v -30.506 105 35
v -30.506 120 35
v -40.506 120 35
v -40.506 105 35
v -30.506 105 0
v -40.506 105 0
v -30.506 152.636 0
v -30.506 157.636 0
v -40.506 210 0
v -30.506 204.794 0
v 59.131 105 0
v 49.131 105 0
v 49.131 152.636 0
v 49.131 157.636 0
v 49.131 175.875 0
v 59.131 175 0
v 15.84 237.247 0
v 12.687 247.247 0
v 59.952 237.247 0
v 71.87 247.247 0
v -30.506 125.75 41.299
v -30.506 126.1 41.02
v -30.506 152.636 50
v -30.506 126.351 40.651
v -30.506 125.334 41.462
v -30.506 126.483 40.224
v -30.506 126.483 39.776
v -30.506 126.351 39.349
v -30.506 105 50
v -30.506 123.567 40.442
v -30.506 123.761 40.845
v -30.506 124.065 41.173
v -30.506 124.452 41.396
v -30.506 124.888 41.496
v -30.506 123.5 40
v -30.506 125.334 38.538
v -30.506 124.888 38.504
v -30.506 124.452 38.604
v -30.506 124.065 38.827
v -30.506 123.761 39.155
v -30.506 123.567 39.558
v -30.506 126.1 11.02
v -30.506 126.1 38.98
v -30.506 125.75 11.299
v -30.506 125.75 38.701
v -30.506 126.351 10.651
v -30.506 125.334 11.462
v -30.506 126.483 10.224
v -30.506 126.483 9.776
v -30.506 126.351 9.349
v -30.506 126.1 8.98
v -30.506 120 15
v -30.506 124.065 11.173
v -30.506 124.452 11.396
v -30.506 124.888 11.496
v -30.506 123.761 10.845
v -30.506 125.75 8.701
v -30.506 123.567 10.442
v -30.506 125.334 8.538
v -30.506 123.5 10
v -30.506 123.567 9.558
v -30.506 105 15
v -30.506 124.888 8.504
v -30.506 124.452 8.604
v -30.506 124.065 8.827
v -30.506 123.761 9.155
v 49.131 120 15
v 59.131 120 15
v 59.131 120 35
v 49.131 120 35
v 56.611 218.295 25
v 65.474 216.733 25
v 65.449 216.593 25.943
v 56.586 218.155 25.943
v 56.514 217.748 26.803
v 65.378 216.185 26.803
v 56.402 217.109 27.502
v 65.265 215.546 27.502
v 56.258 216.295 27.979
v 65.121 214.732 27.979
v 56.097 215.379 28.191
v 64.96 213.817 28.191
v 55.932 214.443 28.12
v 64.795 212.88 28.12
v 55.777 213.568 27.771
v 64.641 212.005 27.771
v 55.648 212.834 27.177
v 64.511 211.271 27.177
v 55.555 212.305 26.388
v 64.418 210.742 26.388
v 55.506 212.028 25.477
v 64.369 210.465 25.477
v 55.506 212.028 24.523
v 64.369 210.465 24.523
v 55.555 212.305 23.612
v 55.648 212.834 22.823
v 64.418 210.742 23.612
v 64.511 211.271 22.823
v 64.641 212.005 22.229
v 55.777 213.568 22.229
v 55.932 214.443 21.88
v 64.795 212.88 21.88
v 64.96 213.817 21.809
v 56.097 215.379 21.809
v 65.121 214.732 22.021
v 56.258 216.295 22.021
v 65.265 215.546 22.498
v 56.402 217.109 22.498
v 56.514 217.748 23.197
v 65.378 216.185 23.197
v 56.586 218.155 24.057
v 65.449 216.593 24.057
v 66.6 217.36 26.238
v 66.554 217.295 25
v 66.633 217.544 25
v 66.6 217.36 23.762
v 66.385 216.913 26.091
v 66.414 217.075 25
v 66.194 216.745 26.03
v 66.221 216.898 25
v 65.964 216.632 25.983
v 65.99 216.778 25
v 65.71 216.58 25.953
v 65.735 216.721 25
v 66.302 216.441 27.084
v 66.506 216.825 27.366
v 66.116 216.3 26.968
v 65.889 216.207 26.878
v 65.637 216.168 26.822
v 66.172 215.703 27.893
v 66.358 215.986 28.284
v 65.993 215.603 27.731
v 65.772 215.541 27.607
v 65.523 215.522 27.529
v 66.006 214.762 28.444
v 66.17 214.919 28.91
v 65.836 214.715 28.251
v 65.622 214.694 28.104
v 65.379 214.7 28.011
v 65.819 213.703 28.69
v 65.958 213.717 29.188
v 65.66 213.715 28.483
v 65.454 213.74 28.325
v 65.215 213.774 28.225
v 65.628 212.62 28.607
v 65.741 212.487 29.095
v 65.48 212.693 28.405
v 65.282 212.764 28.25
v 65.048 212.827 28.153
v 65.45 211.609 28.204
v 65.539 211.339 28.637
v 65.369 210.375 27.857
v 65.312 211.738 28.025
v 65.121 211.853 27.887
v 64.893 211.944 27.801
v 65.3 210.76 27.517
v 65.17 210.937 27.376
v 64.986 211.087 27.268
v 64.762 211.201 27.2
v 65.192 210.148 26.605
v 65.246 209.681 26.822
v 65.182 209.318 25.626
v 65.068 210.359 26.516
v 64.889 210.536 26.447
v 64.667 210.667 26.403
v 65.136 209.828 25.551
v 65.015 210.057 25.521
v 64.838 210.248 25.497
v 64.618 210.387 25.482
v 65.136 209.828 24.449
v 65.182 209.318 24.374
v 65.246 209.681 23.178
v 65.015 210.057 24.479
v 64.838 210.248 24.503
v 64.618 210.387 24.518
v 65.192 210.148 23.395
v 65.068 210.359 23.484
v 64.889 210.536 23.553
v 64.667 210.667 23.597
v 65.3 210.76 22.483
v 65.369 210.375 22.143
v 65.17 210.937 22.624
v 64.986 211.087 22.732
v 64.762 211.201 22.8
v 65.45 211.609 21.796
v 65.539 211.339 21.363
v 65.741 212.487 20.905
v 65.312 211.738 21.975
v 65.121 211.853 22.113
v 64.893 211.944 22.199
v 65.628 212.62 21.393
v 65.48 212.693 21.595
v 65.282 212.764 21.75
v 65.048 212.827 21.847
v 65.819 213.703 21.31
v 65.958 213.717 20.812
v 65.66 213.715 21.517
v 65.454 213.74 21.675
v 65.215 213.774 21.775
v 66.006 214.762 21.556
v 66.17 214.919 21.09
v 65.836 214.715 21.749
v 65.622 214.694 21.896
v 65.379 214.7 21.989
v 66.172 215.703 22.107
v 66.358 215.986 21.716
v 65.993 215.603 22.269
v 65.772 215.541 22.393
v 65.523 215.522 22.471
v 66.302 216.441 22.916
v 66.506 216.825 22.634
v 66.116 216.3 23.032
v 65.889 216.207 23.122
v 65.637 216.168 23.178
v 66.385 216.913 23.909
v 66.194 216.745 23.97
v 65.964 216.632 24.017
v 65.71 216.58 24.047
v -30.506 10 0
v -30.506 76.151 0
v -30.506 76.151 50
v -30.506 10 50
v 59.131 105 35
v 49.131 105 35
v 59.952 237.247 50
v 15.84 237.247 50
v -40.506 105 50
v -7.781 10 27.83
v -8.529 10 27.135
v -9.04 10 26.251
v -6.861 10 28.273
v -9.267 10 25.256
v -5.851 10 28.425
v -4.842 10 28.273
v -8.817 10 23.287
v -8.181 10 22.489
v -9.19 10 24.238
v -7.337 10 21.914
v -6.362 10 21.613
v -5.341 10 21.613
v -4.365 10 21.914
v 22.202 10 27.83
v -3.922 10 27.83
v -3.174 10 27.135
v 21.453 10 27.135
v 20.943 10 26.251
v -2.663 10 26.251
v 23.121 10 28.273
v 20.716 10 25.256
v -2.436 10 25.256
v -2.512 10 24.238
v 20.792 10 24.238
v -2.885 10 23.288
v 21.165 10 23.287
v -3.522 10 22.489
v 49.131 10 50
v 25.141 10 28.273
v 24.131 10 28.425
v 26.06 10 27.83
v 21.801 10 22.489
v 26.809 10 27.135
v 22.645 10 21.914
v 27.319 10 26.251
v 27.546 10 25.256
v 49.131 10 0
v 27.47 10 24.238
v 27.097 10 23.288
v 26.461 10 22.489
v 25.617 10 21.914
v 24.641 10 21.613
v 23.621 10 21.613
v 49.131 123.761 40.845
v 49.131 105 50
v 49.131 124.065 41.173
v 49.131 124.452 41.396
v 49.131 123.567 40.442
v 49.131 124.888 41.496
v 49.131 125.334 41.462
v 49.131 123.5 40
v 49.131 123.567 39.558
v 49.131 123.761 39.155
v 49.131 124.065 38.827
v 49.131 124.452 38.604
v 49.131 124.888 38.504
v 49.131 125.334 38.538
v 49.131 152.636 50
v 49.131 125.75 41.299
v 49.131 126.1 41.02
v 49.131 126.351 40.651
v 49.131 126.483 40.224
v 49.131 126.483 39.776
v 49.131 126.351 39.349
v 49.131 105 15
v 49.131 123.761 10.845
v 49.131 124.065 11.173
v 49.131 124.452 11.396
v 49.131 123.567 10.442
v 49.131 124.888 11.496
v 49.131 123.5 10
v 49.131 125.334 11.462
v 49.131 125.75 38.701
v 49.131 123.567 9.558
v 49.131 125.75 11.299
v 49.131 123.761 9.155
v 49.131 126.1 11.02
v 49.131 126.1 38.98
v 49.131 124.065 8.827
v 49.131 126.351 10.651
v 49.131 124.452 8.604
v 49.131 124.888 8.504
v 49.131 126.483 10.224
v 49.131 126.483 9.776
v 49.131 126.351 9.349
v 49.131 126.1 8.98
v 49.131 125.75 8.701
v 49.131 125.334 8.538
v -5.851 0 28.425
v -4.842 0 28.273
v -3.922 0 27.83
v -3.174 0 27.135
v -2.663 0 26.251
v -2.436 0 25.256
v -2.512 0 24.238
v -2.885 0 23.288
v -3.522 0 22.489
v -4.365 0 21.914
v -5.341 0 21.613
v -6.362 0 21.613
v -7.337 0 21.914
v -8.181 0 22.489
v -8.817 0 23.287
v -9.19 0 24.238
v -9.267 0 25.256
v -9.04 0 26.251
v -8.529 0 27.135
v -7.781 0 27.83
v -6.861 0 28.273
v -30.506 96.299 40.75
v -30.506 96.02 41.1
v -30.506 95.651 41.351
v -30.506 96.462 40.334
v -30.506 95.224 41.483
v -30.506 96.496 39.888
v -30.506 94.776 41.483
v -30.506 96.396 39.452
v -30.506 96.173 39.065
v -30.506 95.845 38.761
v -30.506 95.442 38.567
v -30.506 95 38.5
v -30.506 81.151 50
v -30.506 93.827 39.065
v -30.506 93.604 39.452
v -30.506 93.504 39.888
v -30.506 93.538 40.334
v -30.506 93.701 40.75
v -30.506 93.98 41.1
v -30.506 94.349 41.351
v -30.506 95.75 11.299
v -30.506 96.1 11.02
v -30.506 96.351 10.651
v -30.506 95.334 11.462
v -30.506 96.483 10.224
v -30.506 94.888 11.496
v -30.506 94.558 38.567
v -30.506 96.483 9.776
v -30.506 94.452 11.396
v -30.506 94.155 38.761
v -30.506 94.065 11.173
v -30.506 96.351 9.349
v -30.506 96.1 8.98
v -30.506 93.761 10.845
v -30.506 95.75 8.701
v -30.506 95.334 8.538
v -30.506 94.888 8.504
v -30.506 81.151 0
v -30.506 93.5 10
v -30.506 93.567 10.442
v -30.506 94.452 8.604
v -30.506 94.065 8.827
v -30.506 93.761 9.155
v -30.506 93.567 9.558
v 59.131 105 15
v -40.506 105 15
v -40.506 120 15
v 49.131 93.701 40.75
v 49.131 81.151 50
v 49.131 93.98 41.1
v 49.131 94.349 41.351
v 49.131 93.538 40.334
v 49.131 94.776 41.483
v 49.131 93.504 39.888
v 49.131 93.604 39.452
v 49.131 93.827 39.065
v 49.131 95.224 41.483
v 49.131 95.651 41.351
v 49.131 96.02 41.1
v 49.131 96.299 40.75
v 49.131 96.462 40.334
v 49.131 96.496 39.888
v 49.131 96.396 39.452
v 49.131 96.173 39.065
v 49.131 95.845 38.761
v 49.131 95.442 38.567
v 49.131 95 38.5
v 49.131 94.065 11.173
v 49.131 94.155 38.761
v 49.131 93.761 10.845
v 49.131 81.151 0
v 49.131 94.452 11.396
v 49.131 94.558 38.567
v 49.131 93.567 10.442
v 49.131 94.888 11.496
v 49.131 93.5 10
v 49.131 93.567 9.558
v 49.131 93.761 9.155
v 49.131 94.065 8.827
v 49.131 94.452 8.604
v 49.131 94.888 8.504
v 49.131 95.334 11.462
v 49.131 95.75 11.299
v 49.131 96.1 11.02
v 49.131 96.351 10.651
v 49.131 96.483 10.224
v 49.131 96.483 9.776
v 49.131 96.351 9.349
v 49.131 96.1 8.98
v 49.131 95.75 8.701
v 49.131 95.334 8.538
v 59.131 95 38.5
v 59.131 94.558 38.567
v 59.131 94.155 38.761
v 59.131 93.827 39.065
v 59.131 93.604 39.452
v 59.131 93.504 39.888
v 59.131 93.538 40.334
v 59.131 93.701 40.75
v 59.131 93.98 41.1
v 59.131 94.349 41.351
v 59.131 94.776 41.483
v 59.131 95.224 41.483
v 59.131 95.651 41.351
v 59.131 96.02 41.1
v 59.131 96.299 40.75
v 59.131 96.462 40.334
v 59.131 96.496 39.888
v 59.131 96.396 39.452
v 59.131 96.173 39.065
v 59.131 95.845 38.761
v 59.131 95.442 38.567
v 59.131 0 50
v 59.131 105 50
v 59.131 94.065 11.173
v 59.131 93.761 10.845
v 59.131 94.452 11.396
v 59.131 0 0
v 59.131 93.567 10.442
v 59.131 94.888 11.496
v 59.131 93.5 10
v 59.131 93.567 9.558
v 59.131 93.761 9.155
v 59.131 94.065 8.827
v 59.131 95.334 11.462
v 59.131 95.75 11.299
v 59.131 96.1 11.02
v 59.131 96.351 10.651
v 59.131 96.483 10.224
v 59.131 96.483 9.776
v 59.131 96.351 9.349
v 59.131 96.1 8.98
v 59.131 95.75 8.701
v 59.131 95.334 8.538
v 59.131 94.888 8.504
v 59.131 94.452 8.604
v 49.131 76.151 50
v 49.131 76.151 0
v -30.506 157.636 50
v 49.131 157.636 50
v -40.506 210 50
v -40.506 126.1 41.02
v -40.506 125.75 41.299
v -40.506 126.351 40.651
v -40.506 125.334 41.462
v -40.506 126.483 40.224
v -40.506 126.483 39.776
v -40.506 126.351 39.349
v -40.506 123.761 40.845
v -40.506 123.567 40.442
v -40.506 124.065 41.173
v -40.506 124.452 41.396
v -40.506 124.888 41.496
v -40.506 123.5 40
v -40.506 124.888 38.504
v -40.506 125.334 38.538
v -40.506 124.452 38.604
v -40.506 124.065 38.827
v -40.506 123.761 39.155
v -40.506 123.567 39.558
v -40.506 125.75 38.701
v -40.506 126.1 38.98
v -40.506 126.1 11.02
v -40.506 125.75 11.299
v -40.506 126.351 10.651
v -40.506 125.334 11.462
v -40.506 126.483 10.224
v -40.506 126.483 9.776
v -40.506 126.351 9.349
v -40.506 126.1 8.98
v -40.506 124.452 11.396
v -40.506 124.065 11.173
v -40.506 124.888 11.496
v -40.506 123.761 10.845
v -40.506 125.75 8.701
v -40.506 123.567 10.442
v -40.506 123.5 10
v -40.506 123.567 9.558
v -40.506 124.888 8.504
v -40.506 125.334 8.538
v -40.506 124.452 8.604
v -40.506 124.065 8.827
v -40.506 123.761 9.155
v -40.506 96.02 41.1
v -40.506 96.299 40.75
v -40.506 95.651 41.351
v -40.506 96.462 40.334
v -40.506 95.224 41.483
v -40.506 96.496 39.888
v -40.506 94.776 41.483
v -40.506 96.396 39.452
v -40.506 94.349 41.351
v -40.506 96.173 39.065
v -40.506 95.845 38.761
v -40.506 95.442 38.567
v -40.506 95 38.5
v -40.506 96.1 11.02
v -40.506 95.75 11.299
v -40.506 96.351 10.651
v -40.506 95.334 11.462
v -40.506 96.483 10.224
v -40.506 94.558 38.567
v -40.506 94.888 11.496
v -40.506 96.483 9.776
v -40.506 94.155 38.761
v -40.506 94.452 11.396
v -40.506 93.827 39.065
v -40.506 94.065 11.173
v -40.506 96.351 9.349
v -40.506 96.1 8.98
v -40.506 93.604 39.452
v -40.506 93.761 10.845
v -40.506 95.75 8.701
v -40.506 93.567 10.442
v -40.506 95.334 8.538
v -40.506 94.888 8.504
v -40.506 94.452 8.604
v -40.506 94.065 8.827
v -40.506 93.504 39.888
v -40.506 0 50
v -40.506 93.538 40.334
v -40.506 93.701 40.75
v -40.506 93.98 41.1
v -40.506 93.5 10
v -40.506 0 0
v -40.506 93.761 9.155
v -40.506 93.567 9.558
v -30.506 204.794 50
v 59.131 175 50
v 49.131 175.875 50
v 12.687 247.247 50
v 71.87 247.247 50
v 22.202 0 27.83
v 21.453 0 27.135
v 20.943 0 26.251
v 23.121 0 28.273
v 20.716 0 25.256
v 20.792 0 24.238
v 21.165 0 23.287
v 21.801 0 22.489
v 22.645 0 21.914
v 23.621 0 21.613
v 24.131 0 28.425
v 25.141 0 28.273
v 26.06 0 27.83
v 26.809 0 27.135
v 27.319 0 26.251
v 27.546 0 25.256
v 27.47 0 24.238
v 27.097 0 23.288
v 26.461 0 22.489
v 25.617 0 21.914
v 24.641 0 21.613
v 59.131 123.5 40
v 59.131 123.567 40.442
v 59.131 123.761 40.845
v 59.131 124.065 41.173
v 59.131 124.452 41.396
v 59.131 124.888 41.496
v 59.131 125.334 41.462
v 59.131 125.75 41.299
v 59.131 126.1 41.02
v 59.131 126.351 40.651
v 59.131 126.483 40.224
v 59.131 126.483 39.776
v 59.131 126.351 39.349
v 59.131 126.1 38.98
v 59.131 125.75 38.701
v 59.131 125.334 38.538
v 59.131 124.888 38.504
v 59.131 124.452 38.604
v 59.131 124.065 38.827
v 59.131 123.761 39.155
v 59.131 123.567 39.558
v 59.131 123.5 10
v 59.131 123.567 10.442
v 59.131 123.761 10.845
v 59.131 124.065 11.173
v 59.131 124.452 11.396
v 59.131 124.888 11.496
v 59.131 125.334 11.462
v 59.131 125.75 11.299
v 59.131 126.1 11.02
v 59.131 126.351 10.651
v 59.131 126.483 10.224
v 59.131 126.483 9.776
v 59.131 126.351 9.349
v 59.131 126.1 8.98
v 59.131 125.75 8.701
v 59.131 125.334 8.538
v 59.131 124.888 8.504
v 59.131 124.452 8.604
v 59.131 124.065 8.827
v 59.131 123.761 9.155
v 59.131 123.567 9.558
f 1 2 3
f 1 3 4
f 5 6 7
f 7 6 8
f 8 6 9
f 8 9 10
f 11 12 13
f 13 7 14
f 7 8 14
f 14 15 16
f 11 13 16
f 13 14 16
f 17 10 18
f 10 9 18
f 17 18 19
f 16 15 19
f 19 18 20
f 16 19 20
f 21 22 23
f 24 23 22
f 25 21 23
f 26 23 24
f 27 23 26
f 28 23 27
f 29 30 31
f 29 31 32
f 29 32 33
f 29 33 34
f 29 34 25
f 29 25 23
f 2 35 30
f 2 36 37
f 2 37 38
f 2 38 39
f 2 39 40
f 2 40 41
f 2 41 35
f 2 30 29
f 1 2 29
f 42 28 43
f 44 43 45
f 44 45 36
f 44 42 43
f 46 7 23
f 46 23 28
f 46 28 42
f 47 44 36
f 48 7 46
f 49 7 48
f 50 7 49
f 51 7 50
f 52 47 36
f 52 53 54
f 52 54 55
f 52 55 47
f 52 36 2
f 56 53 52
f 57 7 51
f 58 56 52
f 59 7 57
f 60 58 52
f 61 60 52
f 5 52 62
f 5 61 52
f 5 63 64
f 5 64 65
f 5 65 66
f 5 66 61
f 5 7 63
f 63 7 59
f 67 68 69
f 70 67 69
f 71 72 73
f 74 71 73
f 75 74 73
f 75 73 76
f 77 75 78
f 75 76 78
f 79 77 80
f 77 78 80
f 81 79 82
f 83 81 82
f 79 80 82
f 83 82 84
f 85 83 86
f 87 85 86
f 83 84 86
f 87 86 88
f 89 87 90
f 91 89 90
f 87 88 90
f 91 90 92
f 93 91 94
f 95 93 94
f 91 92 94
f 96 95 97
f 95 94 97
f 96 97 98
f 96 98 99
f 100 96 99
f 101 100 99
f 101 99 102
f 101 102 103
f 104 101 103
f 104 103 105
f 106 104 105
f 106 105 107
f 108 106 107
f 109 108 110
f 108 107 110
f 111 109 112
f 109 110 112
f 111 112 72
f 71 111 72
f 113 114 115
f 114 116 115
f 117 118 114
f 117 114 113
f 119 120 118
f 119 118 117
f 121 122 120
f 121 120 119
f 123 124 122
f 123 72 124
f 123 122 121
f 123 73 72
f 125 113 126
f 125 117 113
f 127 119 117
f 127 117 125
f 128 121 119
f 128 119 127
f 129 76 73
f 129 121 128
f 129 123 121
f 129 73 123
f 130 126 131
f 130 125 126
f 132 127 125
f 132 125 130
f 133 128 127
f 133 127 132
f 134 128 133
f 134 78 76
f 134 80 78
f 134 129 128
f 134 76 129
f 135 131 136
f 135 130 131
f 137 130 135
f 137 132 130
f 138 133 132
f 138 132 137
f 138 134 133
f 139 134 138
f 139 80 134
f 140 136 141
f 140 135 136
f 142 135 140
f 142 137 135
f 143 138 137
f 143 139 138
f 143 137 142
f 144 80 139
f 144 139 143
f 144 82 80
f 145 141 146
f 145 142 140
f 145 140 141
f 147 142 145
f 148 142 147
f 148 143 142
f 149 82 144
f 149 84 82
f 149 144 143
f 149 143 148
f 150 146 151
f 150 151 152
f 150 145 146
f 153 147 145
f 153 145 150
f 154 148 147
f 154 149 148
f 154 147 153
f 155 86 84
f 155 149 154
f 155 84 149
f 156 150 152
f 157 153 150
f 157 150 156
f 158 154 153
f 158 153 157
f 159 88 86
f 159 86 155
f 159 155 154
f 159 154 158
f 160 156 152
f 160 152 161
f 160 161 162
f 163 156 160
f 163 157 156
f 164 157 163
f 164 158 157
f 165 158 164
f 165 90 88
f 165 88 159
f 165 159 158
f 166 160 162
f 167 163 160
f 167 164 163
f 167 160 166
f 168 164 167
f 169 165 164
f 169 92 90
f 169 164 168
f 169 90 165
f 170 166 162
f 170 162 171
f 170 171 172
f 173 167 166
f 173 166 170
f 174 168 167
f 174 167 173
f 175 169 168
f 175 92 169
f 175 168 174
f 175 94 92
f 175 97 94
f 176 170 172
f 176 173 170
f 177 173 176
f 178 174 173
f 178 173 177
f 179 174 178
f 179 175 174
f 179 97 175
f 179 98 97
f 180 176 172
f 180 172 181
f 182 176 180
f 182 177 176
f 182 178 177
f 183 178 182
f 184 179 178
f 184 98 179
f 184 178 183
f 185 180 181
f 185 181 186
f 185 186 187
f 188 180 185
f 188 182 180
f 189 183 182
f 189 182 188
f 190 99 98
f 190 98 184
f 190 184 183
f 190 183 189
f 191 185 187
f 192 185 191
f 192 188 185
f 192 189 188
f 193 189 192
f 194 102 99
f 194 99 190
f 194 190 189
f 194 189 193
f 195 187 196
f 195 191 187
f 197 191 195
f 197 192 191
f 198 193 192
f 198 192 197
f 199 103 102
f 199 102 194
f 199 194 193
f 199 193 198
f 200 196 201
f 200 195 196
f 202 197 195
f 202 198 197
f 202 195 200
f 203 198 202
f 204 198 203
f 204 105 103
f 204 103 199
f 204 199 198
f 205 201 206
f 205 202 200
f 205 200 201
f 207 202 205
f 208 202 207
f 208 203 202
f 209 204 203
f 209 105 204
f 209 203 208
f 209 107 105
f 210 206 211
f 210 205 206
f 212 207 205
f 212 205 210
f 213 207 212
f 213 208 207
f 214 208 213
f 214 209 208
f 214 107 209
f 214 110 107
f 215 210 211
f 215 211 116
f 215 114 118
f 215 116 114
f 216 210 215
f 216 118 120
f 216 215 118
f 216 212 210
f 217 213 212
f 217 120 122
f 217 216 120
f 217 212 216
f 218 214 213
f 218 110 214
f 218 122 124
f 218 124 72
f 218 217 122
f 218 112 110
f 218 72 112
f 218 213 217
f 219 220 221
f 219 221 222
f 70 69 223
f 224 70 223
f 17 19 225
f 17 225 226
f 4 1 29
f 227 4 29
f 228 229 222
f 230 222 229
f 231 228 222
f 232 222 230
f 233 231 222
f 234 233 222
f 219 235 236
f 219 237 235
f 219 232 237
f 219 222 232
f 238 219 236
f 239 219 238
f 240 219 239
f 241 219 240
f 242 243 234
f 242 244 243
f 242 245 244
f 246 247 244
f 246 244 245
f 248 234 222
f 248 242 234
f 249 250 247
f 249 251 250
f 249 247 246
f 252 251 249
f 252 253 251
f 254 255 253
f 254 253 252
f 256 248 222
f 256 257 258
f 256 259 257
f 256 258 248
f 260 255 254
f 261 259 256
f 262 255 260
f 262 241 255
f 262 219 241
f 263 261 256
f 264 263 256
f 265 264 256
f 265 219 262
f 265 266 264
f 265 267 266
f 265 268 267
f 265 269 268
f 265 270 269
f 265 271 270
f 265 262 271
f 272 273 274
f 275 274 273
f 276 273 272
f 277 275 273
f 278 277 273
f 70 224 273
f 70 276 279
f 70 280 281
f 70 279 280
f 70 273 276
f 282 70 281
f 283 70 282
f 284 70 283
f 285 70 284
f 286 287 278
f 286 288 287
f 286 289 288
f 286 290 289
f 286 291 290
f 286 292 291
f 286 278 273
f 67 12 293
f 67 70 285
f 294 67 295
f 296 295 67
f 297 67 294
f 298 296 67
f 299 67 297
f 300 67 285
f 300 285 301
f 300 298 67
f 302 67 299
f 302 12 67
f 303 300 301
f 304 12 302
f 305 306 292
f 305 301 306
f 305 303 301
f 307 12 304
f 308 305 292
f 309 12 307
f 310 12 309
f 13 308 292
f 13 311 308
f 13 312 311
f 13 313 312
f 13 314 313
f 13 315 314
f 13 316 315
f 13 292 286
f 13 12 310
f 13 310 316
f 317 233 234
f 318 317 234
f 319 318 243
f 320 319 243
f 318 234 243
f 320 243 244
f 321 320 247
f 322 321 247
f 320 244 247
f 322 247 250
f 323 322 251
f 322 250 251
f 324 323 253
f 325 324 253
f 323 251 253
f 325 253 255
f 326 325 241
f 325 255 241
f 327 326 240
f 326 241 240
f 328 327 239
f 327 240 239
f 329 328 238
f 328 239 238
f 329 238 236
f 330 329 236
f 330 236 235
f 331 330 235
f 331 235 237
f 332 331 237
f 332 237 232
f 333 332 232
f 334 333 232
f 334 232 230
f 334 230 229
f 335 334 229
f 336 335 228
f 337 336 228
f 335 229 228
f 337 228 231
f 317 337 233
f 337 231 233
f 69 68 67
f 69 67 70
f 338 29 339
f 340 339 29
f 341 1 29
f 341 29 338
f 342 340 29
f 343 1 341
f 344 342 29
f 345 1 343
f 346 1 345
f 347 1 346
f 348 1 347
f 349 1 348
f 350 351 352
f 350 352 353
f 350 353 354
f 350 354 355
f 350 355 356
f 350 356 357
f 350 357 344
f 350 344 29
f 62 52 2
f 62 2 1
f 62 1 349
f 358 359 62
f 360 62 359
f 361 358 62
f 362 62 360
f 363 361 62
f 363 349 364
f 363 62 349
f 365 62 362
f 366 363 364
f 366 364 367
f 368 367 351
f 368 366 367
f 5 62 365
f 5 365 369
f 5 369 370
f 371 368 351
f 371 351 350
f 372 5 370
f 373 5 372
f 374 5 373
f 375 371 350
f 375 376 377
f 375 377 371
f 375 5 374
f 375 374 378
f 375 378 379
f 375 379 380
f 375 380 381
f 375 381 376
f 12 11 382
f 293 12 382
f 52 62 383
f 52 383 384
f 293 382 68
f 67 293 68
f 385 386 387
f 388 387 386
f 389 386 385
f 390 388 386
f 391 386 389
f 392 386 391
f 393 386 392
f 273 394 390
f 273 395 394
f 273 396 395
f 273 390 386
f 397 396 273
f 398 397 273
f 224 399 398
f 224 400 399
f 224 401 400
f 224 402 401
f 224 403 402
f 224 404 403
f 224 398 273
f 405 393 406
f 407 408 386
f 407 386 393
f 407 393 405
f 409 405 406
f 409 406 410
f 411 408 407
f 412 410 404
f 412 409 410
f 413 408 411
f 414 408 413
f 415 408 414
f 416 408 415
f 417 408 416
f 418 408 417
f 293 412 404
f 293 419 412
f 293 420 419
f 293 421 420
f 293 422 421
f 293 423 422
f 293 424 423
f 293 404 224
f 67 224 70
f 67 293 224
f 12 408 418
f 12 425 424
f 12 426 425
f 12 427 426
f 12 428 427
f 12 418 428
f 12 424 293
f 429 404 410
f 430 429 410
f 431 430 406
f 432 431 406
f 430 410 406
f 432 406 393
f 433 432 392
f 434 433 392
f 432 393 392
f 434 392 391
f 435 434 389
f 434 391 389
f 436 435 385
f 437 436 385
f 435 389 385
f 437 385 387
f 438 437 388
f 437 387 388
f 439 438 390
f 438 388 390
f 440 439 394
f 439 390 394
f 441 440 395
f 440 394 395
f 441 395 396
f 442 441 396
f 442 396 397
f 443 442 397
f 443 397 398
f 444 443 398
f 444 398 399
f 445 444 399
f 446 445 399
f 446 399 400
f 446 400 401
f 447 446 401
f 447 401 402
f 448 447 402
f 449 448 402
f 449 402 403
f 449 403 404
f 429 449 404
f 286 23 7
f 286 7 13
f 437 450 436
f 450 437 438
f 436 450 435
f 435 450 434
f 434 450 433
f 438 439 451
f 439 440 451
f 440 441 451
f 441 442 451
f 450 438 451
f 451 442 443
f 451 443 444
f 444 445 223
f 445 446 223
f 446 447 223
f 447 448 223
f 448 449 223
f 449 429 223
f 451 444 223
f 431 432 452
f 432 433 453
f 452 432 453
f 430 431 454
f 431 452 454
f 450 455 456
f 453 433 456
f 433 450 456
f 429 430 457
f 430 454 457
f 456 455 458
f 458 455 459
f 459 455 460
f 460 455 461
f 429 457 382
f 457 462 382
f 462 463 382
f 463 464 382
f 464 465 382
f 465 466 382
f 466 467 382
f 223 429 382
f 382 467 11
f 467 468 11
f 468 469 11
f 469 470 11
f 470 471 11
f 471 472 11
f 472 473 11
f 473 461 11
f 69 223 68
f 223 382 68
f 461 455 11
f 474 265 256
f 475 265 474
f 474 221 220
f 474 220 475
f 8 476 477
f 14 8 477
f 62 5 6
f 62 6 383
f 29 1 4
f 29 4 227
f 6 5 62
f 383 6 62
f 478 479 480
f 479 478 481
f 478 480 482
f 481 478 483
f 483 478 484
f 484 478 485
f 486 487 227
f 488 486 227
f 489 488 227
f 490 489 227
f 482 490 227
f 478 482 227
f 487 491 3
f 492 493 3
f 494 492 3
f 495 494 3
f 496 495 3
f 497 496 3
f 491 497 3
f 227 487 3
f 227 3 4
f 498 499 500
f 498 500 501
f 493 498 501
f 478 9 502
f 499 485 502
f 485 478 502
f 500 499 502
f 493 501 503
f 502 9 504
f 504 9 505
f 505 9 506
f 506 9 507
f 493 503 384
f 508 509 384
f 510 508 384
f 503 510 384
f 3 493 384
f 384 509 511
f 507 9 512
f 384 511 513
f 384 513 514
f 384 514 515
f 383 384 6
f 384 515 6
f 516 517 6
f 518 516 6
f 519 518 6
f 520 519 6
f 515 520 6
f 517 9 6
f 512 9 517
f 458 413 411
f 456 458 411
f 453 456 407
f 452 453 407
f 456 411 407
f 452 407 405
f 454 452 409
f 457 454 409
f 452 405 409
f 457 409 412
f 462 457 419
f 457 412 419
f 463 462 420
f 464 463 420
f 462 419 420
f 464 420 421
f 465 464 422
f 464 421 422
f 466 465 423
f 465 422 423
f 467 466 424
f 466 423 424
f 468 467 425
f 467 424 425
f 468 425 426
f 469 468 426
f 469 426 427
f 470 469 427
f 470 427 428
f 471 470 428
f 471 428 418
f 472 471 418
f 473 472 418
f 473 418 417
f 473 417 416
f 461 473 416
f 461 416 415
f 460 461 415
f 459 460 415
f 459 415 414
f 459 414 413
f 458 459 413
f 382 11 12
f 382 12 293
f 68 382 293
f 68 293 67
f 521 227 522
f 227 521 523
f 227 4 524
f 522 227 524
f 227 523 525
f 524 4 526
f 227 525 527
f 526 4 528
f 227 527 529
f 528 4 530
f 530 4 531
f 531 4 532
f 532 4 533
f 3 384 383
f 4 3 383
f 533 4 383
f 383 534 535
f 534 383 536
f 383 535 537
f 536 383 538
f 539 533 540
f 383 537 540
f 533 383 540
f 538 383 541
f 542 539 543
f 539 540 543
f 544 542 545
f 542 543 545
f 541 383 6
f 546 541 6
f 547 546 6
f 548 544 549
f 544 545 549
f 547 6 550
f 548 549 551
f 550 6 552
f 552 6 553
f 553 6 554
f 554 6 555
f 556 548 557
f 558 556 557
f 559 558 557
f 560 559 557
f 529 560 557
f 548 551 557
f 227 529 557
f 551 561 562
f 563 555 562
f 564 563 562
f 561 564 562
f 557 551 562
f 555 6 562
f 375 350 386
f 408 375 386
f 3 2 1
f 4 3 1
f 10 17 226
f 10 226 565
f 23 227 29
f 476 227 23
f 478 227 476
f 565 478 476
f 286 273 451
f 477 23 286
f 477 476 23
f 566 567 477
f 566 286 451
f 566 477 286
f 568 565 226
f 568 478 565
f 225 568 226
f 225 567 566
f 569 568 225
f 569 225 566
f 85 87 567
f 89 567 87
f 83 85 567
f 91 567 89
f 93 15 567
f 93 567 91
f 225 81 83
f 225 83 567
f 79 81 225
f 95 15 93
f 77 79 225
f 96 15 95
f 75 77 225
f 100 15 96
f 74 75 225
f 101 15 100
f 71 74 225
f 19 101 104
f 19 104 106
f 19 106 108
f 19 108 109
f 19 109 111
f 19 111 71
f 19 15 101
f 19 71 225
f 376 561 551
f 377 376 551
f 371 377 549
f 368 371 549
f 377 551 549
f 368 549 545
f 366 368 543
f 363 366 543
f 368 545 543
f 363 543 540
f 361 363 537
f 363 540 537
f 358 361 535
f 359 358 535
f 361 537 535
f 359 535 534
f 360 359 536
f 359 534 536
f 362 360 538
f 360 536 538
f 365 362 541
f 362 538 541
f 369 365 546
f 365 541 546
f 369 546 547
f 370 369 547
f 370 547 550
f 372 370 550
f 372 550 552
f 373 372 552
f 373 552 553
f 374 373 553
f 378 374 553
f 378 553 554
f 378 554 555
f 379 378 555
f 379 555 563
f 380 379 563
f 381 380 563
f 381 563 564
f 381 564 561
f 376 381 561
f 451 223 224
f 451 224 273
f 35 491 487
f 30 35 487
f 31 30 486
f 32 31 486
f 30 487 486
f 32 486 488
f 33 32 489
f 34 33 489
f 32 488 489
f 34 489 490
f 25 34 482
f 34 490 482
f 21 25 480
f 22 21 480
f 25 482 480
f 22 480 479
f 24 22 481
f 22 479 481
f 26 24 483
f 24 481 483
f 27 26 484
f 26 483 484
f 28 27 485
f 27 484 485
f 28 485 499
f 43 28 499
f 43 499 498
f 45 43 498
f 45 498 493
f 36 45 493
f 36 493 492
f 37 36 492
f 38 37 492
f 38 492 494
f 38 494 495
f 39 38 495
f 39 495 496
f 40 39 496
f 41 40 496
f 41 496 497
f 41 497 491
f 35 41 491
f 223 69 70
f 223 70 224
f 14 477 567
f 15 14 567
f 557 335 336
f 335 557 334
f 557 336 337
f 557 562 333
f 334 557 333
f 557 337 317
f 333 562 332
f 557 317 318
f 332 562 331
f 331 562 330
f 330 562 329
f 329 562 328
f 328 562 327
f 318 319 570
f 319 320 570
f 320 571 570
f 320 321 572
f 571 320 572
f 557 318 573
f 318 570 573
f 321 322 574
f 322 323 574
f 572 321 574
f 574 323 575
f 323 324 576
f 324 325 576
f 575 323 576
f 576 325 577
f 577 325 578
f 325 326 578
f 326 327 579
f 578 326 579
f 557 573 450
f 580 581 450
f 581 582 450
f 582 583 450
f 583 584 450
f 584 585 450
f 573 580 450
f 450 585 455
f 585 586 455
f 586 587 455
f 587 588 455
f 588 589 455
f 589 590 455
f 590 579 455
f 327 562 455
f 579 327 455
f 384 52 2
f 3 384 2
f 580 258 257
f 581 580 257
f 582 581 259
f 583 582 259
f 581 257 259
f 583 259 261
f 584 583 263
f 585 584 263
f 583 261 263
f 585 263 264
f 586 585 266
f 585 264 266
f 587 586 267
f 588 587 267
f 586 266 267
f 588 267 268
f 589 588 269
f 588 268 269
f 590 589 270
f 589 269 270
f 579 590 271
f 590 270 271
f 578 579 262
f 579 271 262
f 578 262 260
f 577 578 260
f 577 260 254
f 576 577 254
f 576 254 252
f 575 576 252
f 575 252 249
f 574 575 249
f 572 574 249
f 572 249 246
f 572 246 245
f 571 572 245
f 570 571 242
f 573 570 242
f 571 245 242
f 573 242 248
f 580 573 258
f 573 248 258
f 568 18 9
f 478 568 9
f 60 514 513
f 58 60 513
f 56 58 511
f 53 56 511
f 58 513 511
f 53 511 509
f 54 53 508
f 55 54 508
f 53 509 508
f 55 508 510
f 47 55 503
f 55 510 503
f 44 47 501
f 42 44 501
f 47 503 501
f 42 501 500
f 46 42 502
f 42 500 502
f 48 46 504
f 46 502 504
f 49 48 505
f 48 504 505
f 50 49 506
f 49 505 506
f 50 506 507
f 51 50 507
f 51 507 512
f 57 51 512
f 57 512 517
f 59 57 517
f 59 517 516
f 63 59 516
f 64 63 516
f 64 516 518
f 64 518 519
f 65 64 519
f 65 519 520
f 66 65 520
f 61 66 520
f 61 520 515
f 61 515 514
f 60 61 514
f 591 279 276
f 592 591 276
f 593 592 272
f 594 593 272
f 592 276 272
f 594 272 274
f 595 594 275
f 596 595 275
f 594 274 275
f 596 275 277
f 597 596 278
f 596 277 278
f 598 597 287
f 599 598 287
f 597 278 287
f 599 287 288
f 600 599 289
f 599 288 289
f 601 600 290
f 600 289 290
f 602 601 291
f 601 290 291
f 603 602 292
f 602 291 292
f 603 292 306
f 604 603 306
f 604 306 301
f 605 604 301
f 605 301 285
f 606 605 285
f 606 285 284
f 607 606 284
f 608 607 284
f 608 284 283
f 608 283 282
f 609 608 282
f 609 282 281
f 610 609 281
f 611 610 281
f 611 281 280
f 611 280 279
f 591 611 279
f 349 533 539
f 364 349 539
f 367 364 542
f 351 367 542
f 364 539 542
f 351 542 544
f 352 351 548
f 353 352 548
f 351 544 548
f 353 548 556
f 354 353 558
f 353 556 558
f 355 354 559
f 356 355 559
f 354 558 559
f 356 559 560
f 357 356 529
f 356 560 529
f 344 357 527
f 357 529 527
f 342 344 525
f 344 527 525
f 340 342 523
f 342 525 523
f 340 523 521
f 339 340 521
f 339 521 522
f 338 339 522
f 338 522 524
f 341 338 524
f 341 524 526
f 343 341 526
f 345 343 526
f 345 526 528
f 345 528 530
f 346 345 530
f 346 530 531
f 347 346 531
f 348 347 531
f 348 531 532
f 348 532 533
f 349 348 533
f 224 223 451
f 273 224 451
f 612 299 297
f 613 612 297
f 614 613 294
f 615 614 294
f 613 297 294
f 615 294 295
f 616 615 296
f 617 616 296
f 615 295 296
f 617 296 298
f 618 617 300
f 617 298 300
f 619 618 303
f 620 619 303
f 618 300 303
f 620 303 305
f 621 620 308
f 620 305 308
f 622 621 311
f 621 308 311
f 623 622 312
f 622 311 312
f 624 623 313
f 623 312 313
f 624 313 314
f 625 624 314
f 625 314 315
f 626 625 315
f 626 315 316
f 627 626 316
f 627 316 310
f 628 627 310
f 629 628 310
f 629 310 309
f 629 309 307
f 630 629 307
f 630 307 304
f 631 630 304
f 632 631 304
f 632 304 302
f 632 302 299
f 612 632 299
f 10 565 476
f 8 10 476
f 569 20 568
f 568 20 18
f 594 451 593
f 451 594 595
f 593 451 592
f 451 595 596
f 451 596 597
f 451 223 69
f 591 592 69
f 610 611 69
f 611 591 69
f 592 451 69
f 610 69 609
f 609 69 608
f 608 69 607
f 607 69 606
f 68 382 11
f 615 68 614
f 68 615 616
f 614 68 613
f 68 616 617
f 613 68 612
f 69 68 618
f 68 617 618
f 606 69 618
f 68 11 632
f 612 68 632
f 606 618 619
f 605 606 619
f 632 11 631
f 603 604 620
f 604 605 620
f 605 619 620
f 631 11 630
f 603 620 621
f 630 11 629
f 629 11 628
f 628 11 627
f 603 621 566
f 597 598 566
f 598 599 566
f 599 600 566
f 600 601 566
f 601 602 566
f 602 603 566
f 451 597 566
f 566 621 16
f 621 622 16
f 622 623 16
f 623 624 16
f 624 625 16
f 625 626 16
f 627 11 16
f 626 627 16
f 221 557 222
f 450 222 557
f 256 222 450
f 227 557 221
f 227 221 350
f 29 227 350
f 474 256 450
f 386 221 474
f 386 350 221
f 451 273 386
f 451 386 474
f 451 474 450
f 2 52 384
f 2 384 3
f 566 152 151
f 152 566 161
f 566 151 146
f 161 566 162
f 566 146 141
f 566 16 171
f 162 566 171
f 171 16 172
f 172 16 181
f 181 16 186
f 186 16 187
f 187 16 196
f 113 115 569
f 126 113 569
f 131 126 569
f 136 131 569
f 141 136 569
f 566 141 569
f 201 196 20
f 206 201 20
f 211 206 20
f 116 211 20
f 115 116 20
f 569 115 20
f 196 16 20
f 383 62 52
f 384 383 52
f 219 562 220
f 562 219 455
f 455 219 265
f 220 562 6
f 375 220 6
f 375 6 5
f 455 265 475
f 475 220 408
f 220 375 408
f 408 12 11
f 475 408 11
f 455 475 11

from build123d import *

# Parameters (mm, degrees)
BOSS_EXTRUDE1_DEPTH    = 50
SKETCH10_R             = 3.425
CUT_EXTRUDE5_DEPTH     = 10
SKETCH11_W             = 79.637459777
SKETCH11_H             = 5
BOSS_EXTRUDE3_DEPTH    = 50
SKETCH14_R             = 3.2
CUT_EXTRUDE6_DEPTH     = 10
FILLET1_R              = 1
SPLIT1_SURFACE_1_BACK  = 277.151
SPLIT1_SURFACE_1_DEPTH = 554.302
SPLIT1_SURFACE_2_BACK  = 277.151
SPLIT1_SURFACE_2_DEPTH = 554.302
SKETCH16_R             = 1.5
CUT_EXTRUDE7_DEPTH     = 99.637459777
CUT_EXTRUDE8_REACH     = 278.151
SKETCH17_R             = 1.5


with BuildPart() as part:
    # Sketch2 → Boss-Extrude1 (new body)
    with BuildSketch(Plane.XY):
        Polygon((-40.506485759, 0), (59.130974018, 0), (59.130974018, 175), (71.870010435, 247.246665631), (12.687265519, 247.246665631), (-40.506485759, 210), align=None)
        Polygon((49.130974018, 175.874886635), (59.952474509, 237.246665631), (15.840253408, 237.246665631), (-30.506485759, 204.794329494), (-30.506485759, 10), (49.130974018, 10), align=None, mode=Mode.SUBTRACT)
    extrude(amount=BOSS_EXTRUDE1_DEPTH)

    # Sketch10 → Cut-Extrude5 (cut)
    with BuildSketch(Plane(origin=(0, 10, 0), x_dir=(1, 0, 0), z_dir=(0, 1, 0))):
        with Locations(Location((-5.851287133, -25, 0), (0, 0, 270))):
            Circle(SKETCH10_R)
        with Locations(Location((24.130974018, -25, 0), (0, 0, 270))):
            Circle(SKETCH10_R)
    extrude(amount=-CUT_EXTRUDE5_DEPTH, mode=Mode.SUBTRACT)

    # Sketch11 → Boss-Extrude3 (add)
    with BuildSketch(Plane.XY.offset(50)):
        with Locations((9.31224413, 155.135730726)):
            Rectangle(SKETCH11_W, SKETCH11_H)
        with Locations((9.31224413, 78.651297101)):
            Rectangle(SKETCH11_W, SKETCH11_H)
    extrude(amount=-BOSS_EXTRUDE3_DEPTH)

    # Sketch14 → Cut-Extrude6 (cut)
    with BuildSketch(Plane(origin=(27.42119444, -4.835096423, 0), x_dir=(0, 0, -1), z_dir=(0.9848077530122082, -0.17364817766693028, 0))):
        with Locations(Location((-25, 221.609342659, 0), (0, 0, 90))):
            Circle(SKETCH14_R)
    extrude(amount=-CUT_EXTRUDE6_DEPTH, mode=Mode.SUBTRACT)

    # Fillet1
    fillet1_edges = [part.edges().sort_by_distance(p)[0] for p in [
        (65.347578778, 210.256117558, 25),
    ]]
    fillet(fillet1_edges, radius=FILLET1_R)


with BuildPart() as body_2:
    # Split1: the piece behind the surface
    add(part.part)
    # Split1 surface: a surface, the sketch's curves swept straight by 554.302 mm
    with BuildLine(Plane.ZY.offset(40.506485759).offset(-SPLIT1_SURFACE_1_BACK), mode=Mode.PRIVATE) as split1_surface_1_path:
        Line((0, 105), (15, 105))
        Line((15, 105), (15, 120))
        Line((15, 120), (35, 120))
        Line((35, 120), (35, 105))
        Line((35, 105), (50, 105))
    split1_surface_1 = Shell.extrude(split1_surface_1_path.wire(), (-1 * SPLIT1_SURFACE_1_DEPTH, 0 * SPLIT1_SURFACE_1_DEPTH, 0 * SPLIT1_SURFACE_1_DEPTH))
    split(bisect_by=split1_surface_1, keep=Keep.BOTTOM)

    # Sketch16 → Cut-Extrude7 (cut)
    with BuildSketch(Plane.ZY.offset(40.506485759)):
        with Locations(Location((10, 95, 0), (0, 0, 270))):
            Circle(SKETCH16_R)
        with Locations(Location((40, 95, 0), (0, 0, 180))):
            Circle(SKETCH16_R)
    extrude(amount=-CUT_EXTRUDE7_DEPTH, mode=Mode.SUBTRACT)


with BuildPart() as part_1:
    add(part.part)

    # Split1: split by a surface, the side it looks to stays
    # Split1 surface: a surface, the sketch's curves swept straight by 554.302 mm
    with BuildLine(Plane.ZY.offset(40.506485759).offset(-SPLIT1_SURFACE_2_BACK), mode=Mode.PRIVATE) as split1_surface_2_path:
        Line((0, 105), (15, 105))
        Line((15, 105), (15, 120))
        Line((15, 120), (35, 120))
        Line((35, 120), (35, 105))
        Line((35, 105), (50, 105))
    split1_surface_2 = Shell.extrude(split1_surface_2_path.wire(), (-1 * SPLIT1_SURFACE_2_DEPTH, 0 * SPLIT1_SURFACE_2_DEPTH, 0 * SPLIT1_SURFACE_2_DEPTH))
    split(bisect_by=split1_surface_2, keep=Keep.TOP)

    # Cut-Extrude8: up to this face of the body (flat: up to its plane)
    cut_extrude8_end = Plane(part_1.part.faces().sort_by_distance((59.130974018, 142.578125, 25))[0])
    # Sketch17 → Cut-Extrude8 (cut, up to the picked face)
    with BuildSketch(Plane.ZY.offset(40.506485759), mode=Mode.PRIVATE) as cut_extrude8_sk1:
        with Locations(Location((40, 125, 0), (0, 0, 270))):
            Circle(SKETCH17_R)
    cut_extrude8_tool1 = split(extrude(cut_extrude8_sk1.sketch, amount=-CUT_EXTRUDE8_REACH, mode=Mode.PRIVATE), bisect_by=cut_extrude8_end, keep=Keep.BOTH, mode=Mode.PRIVATE)
    # Sketch17 → Cut-Extrude8 (cut, up to the picked face)
    with BuildSketch(Plane.ZY.offset(40.506485759), mode=Mode.PRIVATE) as cut_extrude8_sk2:
        with Locations(Location((10, 125, 0), (0, 0, 270))):
            Circle(SKETCH17_R)
    cut_extrude8_tool2 = split(extrude(cut_extrude8_sk2.sketch, amount=-CUT_EXTRUDE8_REACH, mode=Mode.PRIVATE), bisect_by=cut_extrude8_end, keep=Keep.BOTH, mode=Mode.PRIVATE)
    add(cut_extrude8_tool1.solids().sort_by(Axis((-40.506486, 125, 40), (1, 0, 0)))[0], mode=Mode.SUBTRACT)
    add(cut_extrude8_tool2.solids().sort_by(Axis((-40.506486, 125, 10), (1, 0, 0)))[0], mode=Mode.SUBTRACT)


solid = Compound([body_2.part, part_1.part])
